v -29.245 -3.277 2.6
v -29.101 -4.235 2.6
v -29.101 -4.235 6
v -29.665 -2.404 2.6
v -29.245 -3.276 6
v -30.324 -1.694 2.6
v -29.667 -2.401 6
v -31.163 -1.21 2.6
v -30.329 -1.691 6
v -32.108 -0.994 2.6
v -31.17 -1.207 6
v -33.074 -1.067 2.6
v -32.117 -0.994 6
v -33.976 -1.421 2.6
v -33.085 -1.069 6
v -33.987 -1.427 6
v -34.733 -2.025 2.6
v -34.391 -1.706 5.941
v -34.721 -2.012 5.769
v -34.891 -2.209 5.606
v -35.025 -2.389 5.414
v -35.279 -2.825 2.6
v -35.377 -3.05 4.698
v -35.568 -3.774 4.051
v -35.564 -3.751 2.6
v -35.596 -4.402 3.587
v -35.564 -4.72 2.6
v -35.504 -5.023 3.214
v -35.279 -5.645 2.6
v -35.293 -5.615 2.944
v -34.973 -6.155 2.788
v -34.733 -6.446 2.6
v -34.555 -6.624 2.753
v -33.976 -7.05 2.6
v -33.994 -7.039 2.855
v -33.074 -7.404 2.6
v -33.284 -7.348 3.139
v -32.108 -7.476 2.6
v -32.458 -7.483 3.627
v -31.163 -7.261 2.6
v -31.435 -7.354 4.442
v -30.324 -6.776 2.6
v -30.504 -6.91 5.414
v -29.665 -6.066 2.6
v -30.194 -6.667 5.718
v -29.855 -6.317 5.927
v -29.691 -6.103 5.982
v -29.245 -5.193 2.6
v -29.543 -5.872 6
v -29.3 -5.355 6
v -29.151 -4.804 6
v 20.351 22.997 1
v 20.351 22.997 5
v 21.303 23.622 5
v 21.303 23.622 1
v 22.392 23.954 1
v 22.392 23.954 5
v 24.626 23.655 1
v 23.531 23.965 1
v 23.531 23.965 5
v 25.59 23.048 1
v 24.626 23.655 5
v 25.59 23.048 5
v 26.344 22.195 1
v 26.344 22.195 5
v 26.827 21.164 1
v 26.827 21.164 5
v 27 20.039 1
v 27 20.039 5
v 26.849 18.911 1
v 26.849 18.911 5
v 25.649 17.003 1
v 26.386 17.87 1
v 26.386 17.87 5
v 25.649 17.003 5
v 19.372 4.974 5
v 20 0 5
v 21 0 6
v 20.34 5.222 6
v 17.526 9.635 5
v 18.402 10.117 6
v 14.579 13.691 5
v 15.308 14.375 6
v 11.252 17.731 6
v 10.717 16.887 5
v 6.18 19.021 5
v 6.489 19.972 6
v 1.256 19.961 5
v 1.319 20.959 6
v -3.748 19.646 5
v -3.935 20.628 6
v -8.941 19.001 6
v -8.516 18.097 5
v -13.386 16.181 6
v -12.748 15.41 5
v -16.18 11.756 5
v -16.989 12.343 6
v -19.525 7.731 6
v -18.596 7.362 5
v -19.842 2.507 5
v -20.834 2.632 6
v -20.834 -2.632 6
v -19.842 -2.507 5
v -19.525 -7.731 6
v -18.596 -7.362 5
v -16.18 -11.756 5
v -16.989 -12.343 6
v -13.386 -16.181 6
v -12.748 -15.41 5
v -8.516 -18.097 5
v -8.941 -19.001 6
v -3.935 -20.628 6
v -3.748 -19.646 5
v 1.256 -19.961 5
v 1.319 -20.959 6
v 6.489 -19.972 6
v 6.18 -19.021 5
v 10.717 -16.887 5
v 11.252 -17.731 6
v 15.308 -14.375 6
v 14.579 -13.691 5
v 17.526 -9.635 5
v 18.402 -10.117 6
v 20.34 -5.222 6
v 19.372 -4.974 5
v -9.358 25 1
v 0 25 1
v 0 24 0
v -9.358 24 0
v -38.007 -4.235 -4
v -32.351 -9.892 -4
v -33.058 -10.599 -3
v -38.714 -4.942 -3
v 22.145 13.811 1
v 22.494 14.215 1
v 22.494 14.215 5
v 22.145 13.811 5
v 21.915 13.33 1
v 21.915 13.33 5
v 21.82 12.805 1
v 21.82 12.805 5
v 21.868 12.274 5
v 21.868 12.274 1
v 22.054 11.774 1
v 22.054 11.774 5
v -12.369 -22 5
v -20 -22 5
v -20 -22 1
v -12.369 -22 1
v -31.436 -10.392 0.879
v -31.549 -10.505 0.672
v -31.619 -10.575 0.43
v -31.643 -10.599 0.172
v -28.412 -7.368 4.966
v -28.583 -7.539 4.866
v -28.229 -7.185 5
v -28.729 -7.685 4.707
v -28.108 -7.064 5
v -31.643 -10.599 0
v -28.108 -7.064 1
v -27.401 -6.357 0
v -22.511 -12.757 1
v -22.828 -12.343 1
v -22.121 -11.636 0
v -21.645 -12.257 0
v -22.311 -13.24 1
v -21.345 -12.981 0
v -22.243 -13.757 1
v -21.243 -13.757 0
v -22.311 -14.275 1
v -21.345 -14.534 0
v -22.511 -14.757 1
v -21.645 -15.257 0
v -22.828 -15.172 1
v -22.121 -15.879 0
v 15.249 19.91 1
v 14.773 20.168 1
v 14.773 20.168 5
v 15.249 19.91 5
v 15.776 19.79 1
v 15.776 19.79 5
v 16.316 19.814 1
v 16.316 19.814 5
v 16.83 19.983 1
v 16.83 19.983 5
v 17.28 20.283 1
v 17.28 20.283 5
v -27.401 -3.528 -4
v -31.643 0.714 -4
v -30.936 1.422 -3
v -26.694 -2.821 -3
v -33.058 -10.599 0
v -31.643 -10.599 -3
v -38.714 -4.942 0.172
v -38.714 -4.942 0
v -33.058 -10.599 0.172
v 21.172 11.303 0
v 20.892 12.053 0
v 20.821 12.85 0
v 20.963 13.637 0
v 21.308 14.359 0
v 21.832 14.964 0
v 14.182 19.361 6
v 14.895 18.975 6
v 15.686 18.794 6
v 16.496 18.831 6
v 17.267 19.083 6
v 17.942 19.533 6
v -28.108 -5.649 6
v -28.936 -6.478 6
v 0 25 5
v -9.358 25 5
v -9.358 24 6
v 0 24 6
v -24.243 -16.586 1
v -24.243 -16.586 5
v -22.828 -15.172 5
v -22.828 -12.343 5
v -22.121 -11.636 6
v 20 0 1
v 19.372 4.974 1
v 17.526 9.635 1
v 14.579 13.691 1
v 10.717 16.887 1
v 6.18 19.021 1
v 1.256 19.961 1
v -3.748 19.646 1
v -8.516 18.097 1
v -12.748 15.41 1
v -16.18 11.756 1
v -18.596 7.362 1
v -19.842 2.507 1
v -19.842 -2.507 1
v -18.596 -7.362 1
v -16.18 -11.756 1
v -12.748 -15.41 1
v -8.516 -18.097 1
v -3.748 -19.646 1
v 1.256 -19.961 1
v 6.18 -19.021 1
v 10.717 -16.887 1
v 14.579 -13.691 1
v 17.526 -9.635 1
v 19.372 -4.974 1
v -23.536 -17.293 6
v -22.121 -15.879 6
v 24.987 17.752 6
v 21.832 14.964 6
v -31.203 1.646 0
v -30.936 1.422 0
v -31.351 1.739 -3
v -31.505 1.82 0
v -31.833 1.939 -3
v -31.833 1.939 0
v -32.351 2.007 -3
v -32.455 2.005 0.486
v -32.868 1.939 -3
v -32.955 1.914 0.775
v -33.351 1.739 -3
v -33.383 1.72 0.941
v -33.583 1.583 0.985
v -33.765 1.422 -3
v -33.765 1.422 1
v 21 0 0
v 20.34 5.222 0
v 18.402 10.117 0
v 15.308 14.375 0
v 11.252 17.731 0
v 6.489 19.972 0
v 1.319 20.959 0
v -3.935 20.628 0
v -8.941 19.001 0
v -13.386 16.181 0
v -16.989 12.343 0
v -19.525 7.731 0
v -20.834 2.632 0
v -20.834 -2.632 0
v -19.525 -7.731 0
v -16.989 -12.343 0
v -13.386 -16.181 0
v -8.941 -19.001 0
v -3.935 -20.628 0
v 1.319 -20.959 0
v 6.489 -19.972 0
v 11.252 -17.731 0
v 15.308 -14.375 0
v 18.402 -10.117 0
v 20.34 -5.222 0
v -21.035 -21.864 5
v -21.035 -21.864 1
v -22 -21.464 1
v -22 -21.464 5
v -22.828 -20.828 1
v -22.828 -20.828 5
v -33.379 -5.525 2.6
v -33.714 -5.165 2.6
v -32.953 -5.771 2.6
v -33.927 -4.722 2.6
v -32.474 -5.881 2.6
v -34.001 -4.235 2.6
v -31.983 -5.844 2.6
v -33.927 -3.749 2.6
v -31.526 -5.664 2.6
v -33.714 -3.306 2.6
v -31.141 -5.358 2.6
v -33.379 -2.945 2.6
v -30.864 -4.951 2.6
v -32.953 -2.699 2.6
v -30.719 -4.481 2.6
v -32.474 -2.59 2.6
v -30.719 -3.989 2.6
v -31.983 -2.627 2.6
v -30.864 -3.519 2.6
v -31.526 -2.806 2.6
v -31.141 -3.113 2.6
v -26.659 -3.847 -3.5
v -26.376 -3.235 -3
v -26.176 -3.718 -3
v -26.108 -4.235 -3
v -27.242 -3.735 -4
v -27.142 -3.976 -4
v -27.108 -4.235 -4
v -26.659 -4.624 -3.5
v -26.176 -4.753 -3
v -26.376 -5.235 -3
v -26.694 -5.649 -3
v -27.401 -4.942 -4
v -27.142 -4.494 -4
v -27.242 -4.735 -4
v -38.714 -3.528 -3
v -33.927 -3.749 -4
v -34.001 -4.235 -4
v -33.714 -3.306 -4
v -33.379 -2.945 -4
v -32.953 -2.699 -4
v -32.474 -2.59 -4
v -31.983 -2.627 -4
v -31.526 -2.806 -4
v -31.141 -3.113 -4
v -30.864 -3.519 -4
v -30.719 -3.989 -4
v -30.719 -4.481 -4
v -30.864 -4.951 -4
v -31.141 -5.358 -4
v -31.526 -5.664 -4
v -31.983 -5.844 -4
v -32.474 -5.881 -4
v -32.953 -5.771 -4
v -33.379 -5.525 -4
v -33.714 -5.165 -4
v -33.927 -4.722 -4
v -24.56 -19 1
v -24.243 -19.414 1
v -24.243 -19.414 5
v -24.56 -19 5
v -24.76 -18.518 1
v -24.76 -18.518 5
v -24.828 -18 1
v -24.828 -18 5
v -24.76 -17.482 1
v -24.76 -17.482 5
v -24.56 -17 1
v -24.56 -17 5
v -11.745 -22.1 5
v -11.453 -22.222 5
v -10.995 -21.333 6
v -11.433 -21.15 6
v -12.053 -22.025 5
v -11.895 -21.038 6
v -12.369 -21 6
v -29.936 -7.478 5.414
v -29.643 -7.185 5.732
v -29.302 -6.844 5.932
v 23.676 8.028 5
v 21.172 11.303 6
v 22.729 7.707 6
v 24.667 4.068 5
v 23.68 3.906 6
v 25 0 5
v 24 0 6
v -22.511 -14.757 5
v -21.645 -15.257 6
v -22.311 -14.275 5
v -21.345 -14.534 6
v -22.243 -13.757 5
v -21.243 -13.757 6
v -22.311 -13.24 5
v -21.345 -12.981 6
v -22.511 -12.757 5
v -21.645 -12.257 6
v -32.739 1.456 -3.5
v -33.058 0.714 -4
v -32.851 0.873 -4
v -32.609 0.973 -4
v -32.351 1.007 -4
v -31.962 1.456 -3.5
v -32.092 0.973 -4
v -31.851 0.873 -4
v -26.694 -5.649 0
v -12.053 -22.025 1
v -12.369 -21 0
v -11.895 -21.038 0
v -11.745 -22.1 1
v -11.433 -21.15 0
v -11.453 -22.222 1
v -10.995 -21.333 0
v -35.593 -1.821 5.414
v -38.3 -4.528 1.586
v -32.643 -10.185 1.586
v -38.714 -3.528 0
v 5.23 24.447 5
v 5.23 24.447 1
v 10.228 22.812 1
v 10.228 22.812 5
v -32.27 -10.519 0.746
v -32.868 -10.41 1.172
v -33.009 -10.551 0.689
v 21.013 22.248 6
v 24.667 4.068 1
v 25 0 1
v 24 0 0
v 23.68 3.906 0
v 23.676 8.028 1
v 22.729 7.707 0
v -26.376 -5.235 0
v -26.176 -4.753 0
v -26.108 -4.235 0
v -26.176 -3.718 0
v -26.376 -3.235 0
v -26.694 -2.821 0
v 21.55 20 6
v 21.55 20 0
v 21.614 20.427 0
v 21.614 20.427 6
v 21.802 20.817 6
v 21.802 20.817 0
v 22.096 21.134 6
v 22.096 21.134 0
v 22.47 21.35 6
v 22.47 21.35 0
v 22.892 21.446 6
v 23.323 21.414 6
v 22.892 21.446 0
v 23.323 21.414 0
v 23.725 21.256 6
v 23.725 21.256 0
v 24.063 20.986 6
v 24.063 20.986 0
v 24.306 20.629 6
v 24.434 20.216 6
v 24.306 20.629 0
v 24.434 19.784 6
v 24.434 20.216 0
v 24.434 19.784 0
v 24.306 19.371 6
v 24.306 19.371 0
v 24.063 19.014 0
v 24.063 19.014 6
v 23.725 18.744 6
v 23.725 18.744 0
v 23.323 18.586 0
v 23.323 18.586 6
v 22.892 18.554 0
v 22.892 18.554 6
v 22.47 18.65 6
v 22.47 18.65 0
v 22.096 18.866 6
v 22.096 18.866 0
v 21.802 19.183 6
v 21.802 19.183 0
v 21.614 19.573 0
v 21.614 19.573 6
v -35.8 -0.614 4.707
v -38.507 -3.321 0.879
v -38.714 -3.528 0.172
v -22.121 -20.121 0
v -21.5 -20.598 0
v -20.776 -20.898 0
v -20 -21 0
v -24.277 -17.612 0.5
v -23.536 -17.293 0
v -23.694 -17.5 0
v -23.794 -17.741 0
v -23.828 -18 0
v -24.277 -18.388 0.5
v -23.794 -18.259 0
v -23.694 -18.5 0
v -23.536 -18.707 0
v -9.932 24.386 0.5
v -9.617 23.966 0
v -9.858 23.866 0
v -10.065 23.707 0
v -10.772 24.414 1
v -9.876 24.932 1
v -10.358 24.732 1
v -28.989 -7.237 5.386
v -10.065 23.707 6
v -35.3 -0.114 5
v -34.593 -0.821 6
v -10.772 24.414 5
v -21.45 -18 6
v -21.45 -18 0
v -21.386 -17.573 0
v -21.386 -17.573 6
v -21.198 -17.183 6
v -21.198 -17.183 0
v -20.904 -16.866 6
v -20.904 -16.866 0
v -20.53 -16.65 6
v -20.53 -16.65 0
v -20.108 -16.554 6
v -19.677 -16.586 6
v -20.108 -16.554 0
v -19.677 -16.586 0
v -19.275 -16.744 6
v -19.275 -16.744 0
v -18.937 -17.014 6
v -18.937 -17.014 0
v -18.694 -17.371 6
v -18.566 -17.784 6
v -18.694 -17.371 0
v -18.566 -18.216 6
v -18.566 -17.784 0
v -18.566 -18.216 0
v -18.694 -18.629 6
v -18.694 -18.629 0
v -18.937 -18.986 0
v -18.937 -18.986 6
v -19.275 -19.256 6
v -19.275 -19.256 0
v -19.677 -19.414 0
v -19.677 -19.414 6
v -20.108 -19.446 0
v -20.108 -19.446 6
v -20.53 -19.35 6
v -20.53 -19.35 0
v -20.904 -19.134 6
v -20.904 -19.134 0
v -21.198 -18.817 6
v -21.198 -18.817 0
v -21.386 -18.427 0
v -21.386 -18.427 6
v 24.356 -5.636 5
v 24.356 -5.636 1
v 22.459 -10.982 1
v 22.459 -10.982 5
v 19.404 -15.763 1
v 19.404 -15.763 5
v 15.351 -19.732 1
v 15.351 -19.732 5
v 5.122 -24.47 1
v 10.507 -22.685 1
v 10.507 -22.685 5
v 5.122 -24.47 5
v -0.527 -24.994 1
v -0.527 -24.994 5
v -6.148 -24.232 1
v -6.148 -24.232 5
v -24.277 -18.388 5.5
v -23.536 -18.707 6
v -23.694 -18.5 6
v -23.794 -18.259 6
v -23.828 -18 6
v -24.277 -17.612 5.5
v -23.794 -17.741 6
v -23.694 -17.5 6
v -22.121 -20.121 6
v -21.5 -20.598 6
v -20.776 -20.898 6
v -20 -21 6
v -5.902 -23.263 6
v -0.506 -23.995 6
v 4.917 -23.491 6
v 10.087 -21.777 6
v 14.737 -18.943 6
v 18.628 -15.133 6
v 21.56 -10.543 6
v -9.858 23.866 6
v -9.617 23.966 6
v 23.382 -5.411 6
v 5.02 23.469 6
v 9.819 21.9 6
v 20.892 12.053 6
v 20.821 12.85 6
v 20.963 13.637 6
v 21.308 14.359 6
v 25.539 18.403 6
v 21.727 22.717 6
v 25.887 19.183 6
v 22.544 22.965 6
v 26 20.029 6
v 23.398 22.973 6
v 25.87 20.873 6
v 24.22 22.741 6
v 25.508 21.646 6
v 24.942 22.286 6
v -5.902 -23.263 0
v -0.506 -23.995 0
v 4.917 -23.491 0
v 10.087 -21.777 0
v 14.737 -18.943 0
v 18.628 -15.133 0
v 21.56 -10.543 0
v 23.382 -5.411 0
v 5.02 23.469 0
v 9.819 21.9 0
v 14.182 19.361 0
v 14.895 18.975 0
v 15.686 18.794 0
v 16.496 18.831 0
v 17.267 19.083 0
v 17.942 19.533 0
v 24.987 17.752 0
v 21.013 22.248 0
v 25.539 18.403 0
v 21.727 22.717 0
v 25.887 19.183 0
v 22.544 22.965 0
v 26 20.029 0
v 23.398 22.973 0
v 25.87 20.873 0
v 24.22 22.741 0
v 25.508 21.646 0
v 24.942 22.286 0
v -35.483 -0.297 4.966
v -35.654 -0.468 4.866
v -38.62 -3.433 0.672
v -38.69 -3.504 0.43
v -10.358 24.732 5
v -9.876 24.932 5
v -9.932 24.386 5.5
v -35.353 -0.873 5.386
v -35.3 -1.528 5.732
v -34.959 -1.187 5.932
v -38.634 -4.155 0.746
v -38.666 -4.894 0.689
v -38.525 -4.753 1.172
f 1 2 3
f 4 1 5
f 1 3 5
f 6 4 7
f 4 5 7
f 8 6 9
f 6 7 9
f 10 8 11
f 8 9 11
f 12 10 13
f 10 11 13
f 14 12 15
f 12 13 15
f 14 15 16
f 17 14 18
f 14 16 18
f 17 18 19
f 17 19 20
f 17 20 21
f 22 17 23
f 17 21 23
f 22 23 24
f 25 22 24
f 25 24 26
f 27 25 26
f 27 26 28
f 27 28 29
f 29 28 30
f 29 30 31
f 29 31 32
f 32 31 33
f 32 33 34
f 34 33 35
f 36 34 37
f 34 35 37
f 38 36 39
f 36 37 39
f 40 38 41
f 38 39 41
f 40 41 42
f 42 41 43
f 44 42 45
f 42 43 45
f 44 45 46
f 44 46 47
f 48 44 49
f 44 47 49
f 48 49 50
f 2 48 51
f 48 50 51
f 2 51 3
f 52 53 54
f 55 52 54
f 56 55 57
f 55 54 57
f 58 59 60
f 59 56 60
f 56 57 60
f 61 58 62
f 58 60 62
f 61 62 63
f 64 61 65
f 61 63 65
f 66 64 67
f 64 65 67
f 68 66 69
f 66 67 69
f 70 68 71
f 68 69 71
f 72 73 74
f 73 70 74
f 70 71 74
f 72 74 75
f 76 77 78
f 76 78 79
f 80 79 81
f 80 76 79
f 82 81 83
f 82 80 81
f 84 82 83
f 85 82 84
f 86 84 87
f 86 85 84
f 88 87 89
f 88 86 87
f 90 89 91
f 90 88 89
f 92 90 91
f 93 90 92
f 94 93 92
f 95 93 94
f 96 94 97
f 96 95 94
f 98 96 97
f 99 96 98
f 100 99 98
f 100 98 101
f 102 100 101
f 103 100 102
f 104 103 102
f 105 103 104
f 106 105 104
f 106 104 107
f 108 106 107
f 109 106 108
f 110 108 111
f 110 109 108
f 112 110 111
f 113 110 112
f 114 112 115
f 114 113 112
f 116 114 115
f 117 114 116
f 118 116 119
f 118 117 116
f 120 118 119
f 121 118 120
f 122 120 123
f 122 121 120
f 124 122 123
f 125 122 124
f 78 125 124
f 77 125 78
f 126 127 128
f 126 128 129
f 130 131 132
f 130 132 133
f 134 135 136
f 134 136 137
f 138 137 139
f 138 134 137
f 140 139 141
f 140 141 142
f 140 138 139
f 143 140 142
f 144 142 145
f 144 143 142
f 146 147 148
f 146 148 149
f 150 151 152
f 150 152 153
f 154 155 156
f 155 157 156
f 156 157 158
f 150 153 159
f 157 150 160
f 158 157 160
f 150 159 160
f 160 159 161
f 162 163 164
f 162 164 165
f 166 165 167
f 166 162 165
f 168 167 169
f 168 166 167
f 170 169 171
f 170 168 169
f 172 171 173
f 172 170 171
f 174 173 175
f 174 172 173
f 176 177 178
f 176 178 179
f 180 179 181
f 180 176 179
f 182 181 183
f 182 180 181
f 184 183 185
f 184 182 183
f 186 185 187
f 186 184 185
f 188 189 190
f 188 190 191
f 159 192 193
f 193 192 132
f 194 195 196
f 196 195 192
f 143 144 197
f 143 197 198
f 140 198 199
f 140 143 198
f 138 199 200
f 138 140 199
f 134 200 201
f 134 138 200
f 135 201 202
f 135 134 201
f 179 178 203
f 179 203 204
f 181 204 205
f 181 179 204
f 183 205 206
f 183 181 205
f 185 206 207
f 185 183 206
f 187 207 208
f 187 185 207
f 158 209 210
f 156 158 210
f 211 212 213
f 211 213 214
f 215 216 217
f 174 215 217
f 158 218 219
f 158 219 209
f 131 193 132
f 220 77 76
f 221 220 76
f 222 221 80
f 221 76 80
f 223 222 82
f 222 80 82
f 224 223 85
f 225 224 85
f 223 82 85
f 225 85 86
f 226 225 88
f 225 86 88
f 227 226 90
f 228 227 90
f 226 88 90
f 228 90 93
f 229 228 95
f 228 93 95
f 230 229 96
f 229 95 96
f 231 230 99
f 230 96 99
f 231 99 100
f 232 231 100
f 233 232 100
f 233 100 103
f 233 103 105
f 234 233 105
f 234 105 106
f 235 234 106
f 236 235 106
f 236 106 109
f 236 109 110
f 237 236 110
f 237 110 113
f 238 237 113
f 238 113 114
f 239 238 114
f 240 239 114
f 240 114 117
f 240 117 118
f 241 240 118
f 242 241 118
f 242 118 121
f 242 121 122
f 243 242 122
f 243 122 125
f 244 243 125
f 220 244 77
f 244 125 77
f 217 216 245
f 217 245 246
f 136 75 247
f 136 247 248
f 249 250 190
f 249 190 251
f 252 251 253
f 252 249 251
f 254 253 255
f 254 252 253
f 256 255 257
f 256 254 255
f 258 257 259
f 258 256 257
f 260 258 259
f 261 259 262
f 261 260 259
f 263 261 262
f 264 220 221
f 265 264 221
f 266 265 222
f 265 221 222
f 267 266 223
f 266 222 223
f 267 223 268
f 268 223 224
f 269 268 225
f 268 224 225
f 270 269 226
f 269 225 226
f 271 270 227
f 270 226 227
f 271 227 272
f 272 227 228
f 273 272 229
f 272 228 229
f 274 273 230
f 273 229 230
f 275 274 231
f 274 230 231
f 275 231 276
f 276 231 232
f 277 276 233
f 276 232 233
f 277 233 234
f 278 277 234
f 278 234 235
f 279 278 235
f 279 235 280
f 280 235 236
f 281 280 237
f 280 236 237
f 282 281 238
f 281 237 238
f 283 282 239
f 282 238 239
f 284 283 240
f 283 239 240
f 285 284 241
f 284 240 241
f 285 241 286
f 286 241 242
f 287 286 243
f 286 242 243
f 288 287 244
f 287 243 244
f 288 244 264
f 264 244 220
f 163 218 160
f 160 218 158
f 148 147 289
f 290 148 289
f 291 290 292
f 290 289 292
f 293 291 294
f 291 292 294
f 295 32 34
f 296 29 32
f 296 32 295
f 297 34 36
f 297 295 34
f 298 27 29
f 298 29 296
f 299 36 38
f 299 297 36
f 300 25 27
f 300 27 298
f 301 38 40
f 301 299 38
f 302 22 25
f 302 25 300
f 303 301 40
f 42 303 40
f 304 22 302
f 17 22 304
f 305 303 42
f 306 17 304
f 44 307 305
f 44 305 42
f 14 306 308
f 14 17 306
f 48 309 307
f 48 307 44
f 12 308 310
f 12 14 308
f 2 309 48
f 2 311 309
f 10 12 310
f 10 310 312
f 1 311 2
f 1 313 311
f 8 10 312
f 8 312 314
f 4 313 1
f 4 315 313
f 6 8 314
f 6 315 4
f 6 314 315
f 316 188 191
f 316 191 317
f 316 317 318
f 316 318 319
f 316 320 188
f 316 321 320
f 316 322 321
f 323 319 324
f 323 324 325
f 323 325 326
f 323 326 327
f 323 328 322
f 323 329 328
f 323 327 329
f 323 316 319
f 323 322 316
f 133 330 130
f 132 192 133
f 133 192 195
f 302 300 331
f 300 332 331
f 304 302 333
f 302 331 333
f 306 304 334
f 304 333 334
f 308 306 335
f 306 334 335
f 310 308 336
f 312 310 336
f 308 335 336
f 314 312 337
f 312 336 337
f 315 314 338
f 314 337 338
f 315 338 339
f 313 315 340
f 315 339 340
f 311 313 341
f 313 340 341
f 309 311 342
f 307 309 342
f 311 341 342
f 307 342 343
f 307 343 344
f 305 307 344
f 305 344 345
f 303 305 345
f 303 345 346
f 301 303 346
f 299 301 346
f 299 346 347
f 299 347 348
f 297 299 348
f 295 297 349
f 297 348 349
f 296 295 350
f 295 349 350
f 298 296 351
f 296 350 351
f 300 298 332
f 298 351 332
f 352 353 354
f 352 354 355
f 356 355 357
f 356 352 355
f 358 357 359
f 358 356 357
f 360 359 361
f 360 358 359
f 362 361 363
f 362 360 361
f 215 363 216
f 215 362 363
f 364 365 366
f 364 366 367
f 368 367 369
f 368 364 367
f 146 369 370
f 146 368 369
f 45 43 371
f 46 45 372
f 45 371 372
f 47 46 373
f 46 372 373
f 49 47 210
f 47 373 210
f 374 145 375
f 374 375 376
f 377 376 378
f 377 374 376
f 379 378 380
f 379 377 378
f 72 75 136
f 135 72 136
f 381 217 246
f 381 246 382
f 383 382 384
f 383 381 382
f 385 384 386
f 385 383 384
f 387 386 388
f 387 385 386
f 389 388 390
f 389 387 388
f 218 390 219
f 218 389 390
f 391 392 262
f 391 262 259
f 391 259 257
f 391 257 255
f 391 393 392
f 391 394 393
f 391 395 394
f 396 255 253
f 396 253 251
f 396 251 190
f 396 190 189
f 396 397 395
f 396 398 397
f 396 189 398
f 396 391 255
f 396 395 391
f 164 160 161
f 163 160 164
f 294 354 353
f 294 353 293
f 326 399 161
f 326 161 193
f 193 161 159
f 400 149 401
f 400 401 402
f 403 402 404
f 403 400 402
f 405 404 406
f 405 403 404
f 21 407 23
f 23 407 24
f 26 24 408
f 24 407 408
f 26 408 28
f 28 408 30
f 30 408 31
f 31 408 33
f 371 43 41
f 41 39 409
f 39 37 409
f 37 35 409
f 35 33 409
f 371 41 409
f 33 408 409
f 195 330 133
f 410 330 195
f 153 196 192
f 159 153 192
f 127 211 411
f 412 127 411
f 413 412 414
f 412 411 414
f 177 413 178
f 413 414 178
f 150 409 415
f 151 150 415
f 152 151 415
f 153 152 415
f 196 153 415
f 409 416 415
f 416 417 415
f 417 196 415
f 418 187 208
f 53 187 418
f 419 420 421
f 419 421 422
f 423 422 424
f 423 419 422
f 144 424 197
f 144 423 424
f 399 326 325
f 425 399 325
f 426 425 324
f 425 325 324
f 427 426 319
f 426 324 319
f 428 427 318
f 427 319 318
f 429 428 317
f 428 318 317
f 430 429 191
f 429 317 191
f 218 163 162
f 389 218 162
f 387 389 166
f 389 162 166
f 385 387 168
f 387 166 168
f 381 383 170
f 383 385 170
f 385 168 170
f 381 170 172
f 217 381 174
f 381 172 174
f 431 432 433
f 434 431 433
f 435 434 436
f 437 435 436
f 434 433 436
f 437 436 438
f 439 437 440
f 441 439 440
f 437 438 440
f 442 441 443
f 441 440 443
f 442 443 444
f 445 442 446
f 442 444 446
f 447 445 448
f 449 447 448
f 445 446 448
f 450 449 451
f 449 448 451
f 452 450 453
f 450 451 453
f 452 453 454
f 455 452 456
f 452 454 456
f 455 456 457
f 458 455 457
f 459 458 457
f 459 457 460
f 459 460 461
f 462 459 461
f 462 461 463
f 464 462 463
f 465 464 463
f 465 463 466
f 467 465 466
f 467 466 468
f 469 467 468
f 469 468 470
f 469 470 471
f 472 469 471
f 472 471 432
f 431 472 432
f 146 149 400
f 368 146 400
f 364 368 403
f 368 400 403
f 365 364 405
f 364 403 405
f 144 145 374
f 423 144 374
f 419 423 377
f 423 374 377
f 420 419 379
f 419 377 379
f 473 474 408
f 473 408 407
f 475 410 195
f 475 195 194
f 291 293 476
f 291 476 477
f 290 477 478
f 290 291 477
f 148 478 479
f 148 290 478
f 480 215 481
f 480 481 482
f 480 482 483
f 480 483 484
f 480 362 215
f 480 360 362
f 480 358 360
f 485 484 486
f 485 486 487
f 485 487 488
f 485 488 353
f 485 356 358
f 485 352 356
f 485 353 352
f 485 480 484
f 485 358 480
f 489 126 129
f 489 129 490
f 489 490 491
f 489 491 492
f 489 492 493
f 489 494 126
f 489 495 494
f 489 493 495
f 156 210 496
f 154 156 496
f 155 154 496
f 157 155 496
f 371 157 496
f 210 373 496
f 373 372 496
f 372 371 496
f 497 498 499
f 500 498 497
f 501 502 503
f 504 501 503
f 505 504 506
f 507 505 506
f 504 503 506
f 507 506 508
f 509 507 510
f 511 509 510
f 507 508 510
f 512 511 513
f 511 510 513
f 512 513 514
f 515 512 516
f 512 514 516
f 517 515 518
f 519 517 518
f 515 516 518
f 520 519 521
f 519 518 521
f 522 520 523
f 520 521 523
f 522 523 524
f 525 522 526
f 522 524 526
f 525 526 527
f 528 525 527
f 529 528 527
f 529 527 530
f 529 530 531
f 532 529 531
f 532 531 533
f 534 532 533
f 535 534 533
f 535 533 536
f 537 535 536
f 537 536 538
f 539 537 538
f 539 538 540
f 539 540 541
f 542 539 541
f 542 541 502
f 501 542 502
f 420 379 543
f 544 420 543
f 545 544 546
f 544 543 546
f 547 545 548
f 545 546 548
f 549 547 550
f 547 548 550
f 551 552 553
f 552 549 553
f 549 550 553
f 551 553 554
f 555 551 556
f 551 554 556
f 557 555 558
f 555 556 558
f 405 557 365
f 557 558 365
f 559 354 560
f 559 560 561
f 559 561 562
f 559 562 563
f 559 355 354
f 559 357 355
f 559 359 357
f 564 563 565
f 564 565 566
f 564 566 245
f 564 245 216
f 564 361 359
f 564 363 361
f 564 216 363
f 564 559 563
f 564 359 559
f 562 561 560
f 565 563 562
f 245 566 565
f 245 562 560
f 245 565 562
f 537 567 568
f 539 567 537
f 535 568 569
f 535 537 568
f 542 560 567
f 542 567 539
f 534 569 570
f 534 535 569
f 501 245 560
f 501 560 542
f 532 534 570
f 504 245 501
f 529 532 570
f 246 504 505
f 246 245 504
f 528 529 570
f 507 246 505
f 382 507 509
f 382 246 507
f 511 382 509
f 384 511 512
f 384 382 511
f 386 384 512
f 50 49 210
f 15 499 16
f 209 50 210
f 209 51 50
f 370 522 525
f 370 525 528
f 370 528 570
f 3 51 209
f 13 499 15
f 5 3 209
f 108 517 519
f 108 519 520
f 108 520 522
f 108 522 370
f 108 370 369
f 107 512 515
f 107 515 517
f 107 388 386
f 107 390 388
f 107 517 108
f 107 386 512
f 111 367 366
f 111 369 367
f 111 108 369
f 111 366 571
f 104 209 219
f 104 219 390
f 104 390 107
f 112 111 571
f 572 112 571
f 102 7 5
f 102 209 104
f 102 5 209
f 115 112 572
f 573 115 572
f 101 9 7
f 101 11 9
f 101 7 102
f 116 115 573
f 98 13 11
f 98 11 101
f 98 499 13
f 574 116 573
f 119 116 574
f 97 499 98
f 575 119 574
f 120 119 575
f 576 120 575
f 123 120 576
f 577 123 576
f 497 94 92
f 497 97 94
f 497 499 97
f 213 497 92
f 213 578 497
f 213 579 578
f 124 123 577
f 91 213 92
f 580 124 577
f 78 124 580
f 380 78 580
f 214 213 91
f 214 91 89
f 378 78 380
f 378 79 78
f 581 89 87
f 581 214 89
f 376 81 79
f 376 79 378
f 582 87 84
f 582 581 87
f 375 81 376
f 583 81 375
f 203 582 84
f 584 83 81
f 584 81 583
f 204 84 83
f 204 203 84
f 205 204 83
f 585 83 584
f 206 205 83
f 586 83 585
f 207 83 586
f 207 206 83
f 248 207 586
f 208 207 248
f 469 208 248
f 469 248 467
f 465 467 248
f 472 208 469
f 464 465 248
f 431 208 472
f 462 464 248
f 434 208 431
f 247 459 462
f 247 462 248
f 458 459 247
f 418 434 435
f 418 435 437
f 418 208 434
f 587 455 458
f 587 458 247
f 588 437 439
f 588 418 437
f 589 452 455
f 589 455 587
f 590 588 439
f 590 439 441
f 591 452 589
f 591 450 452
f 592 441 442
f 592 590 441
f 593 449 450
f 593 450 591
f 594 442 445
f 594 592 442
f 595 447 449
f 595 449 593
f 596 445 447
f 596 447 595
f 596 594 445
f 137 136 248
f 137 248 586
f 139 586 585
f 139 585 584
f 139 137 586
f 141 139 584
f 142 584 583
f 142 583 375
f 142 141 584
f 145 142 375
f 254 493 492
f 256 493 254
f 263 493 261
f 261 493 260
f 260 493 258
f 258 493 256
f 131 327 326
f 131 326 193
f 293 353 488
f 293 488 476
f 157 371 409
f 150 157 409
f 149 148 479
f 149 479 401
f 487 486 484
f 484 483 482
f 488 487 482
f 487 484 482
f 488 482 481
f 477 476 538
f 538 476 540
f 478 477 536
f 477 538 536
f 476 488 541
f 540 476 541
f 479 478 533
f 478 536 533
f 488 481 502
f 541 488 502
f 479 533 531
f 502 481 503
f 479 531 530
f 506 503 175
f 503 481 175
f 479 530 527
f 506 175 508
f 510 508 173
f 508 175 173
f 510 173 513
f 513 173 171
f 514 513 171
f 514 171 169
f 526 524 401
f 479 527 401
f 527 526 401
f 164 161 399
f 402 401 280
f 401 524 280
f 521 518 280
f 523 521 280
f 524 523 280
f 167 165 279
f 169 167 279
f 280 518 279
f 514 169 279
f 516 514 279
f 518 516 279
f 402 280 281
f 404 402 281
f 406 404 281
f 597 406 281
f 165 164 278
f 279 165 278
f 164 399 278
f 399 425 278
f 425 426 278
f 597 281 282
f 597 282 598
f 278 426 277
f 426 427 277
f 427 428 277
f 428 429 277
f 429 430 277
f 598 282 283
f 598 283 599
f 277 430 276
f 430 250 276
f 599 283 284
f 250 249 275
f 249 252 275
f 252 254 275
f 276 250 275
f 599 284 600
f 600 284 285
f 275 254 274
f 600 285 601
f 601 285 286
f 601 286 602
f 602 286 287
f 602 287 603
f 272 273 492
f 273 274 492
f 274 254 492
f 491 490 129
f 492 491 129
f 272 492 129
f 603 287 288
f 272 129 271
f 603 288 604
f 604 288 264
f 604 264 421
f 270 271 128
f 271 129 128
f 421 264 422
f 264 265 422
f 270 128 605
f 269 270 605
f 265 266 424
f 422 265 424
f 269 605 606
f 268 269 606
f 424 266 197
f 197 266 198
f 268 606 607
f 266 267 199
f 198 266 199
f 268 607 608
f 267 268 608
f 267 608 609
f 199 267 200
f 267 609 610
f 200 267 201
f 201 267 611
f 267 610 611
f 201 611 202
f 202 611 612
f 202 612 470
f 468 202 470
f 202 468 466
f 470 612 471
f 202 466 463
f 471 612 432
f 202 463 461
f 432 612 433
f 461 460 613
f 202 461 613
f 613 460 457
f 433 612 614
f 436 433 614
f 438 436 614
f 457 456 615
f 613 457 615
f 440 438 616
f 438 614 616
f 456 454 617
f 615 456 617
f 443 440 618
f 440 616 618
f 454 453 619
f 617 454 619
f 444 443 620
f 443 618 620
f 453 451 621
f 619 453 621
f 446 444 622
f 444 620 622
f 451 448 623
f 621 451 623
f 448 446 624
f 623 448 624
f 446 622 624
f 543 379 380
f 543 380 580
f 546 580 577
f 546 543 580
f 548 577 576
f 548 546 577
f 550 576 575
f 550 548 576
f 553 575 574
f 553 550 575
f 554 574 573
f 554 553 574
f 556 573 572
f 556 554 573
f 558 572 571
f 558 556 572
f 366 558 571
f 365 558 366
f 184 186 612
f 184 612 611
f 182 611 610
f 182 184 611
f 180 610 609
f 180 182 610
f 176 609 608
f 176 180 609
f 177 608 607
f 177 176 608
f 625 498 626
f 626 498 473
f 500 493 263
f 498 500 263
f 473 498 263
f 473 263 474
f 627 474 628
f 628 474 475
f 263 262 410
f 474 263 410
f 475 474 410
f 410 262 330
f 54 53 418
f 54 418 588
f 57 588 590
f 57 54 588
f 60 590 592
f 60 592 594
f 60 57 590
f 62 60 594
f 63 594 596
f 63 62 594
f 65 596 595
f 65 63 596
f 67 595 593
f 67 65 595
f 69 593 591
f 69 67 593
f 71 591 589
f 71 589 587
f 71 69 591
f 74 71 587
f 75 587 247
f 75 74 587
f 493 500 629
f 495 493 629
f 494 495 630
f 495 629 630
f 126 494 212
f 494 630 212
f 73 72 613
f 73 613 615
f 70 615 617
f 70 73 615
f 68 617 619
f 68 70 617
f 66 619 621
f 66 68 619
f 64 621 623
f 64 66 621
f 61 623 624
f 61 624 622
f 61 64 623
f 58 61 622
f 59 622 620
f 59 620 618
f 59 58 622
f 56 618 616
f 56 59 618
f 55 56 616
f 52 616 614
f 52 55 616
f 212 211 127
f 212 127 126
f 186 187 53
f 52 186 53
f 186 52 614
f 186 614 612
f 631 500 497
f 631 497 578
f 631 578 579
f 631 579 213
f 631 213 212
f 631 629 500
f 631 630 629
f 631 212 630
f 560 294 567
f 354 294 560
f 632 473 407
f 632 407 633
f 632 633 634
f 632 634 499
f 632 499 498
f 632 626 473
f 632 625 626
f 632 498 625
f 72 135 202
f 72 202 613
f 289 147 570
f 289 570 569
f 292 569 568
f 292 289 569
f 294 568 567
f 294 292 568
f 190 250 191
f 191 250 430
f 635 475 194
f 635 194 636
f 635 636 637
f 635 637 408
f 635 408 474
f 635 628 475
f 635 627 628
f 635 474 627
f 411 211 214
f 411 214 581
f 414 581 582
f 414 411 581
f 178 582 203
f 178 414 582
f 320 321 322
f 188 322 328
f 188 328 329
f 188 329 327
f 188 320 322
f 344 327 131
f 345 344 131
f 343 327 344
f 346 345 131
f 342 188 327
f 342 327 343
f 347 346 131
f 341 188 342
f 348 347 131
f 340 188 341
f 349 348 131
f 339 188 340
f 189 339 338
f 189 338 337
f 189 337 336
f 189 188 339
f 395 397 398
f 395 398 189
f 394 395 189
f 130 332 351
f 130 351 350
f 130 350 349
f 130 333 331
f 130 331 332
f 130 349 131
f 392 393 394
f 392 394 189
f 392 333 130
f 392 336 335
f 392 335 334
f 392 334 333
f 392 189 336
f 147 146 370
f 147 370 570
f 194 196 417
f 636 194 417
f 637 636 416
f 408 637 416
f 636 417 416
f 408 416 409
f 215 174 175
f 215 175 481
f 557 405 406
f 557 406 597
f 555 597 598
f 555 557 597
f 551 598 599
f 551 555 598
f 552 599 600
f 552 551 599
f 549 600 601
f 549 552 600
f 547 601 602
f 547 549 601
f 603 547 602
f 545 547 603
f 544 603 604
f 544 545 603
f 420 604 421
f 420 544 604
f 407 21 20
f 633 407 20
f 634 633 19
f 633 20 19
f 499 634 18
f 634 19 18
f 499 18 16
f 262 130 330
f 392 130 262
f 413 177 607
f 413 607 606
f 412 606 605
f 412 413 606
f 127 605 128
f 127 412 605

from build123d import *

# Parameters (mm, degrees)
SKETCH_1_W                   = 60
SKETCH_1_H                   = 55
EXTRUDE_1_DEPTH              = 6
HOLE_WIZARD_M4_1_D           = 2.9
HOLE_WIZARD_M4_1_DEPTH       = 10
SKETCH_5_R                   = 20
CUT_EXTRUDE_1_DEPTH          = 7
SKETCH_6_W                   = 60
SKETCH_6_H                   = 55
CUT_EXTRUDE_2_DEPTH          = 7
EXTRUDE_2_DEPTH              = 6
EXTRUDE_3_DEPTH              = 6
EXTRUDE_4_DEPTH              = 4
CUT_EXTRUDE_3_DEPTH          = 11
CUT_EXTRUDE_4_DEPTH          = 6
FILLET_1_R                   = 2
EXTRUDE_5_DEPTH              = 6
CHAMFER_2_SIZE               = 5
FILLET_4_R                   = 2
CHAMFER_3_SIZE               = 1
HOLE_WIZARD_M3_2_D           = 3.3
HOLE_WIZARD_M3_2_DEPTH       = 10
HOLE_WIZARD_M3_2_CBORE_D     = 6.5
HOLE_WIZARD_M3_2_CBORE_DEPTH = 3.4
HOLE_WIZARD_M3_2_TIP         = 0.991420021


with BuildPart() as part:
    # ｽｹｯﾁ1 → ﾎﾞｽ - 押し出し1 (new body)
    with BuildSketch(Plane.XY):
        Rectangle(SKETCH_1_W, SKETCH_1_H)
    extrude(amount=EXTRUDE_1_DEPTH)

    # M4 すきま穴1
    with Locations(Plane.XY.offset(6)):
        with Locations((-20, -18), (23, 20)):
            Hole(HOLE_WIZARD_M4_1_D / 2, depth=HOLE_WIZARD_M4_1_DEPTH)

    # ｽｹｯﾁ5 → ｶｯﾄ - 押し出し1 (cut, through all)
    with BuildSketch(Plane.XY.offset(6)):
        Circle(SKETCH_5_R)
    extrude(amount=-CUT_EXTRUDE_1_DEPTH, mode=Mode.SUBTRACT)

    # ｽｹｯﾁ6 → ｶｯﾄ - 押し出し2 (cut, through all)
    with BuildSketch(Plane.XY.offset(6)):
        Rectangle(SKETCH_6_W, SKETCH_6_H)
        with BuildLine():
            ThreePointArc((-17.351208814, -20.997316342), (-22.997316342, -20.648791186), (-22.648791186, -15.002683658))
            Line((-22.648791186, -15.002683658), (-21.007829355, -13.552531342))
            ThreePointArc((-21.007829355, -13.552531342), (-16.554944912, 18.733227137), (16.03335661, 19.181539975))
            Line((16.03335661, 19.181539975), (20.351208814, 22.997316342))
            ThreePointArc((20.351208814, 22.997316342), (25.997316342, 22.648791186), (25.648791186, 17.002683658))
            Line((25.648791186, 17.002683658), (21.271672672, 13.134532414))
            ThreePointArc((21.271672672, 13.134532414), (24.04986296, 6.826718948), (25, 0))
            ThreePointArc((25, 0), (10.810307191, -22.541900062), (-15.650980674, -19.494789148))
            Line((-15.650980674, -19.494789148), (-17.351208814, -20.997316342))
        make_face(mode=Mode.SUBTRACT)
    extrude(amount=-CUT_EXTRUDE_2_DEPTH, mode=Mode.SUBTRACT)

    # ｽｹｯﾁ7 → ﾎﾞｽ - 押し出し2 (add)
    with BuildSketch(Plane.XY.offset(6)):
        with BuildLine():
            Line((0, 25), (-21.5, 25))
            Line((-21.5, 25), (-21.5, 12.757350822))
            ThreePointArc((-21.5, 12.757350822), (-12.370655388, 21.724798855), (0, 25))
        make_face()
        with BuildLine():
            ThreePointArc((-17.351208814, -20.997316342), (-18.583890076, -21.74094008), (-20, -22))
            Line((-20, -22), (-11.874342087, -22))
            ThreePointArc((-11.874342087, -22), (-13.819546614, -20.833149819), (-15.650980674, -19.494789148))
            Line((-15.650980674, -19.494789148), (-17.351208814, -20.997316342))
        make_face()
        with BuildLine():
            ThreePointArc((-21.007829355, -13.552531342), (-21.25763315, -13.157242601), (-21.5, -12.757350822))
            Line((-21.5, -12.757350822), (-21.5, -13.987472843))
            Line((-21.5, -13.987472843), (-21.007829355, -13.552531342))
        make_face()
    extrude(amount=-EXTRUDE_2_DEPTH)

    # ｽｹｯﾁ8 → ﾎﾞｽ - 押し出し3 (add)
    with BuildSketch(Plane.XY.offset(6)):
        with BuildLine():
            Line((-21.5, 12.757350822), (-21.5, 25))
            Line((-21.5, 25), (-45.078427125, 1.421572875))
            Line((-45.078427125, 1.421572875), (-22.82842714, -20.828427109))
            ThreePointArc((-22.82842714, -20.828427109), (-23.998099778, -17.876719173), (-22.648791186, -15.002683658))
            Line((-22.648791186, -15.002683658), (-21.5, -13.987472843))
            Line((-21.5, -13.987472843), (-21.5, -12.757350822))
            ThreePointArc((-21.5, -12.757350822), (-25, 0), (-21.5, 12.757350822))
        make_face()
    extrude(amount=-EXTRUDE_3_DEPTH)

    # ｽｹｯﾁ9 → ﾎﾞｽ - 押し出し4 (add)
    with BuildSketch(Plane(origin=(0, 0, 0), x_dir=(-1, 0, 0), z_dir=(0, 0, -1))):
        Polygon((25.279437252, -4.235281374), (32.350505063, -11.306349186), (45.078427125, 1.421572875), (38.007359313, 8.492640687), align=None)
    extrude(amount=EXTRUDE_4_DEPTH)

    # ｽｹｯﾁ10 → ｶｯﾄ - 押し出し3 (cut, through all)
    with BuildSketch(Plane(origin=(0, 0, -4), x_dir=(-1, 0, 0), z_dir=(0, 0, -1))):
        Polygon((38.007359313, 8.492640687), (21.5, 25), (10.186291501, 25), (39.421572875, -4.235281374), (45.078427125, 1.421572875), align=None)
    extrude(amount=-CUT_EXTRUDE_3_DEPTH, mode=Mode.SUBTRACT)

    # ｽｹｯﾁ12 → ｶｯﾄ - 押し出し4 (cut)
    with BuildSketch(Plane.XY.offset(6)):
        Polygon((-39.421572875, -4.235281374), (-25.656854249, -18), (-21.414213562, -13.757359313), (-35.178932188, 0.007359313), align=None)
    extrude(amount=-CUT_EXTRUDE_4_DEPTH, mode=Mode.SUBTRACT)

    # ﾌｨﾚｯﾄ1
    fillet_1_edges = [part.edges().sort_by_distance(p)[0] for p in [
        (-25.279437252, -4.235281374, -2),
        (-32.350505063, 2.835786438, -2),
        (-25.656854249, -18, 3),
    ]]
    fillet(fillet_1_edges, radius=FILLET_1_R)

    # ｽｹｯﾁ13 → ﾎﾞｽ - 押し出し5 (add)
    with BuildSketch(Plane.XY):
        Polygon((-32.350505063, -11.306349186), (-28.107864376, -7.063708499), (-35.178932188, 0.007359313), (-39.421572875, -4.235281374), align=None)
    extrude(amount=EXTRUDE_5_DEPTH)

    # 面取り2
    chamfer_2_edges = [part.edges().sort_by_distance(p)[0] for p in [
        (-35.886038969, -7.77081528, 6),
    ]]
    chamfer(chamfer_2_edges, length=CHAMFER_2_SIZE)

    # ﾌｨﾚｯﾄ4
    fillet_4_edges = [part.edges().sort_by_distance(p)[0] for p in [
        (-10.186291501, 25, 3),
        (-21.414213562, -13.757359313, 3),
        (-32.350505063, -4.235281374, 6),
        (-35.886038969, -7.77081528, 1),
        (21.271672672, 13.134532414, 3),
        (16.03335661, 19.181539975, 3),
        (-11.874342087, -22, 3),
    ]]
    fillet(fillet_4_edges, radius=FILLET_4_R)

    # 面取り3
    chamfer_3_edges = [part.edges().sort_by_distance(p)[0] for p in [
        (-21.53073374, -21.695518126, 6),
        (-21.53073374, -21.695518126, 0),
        (-23.535533914, -20.121320336, 0),
        (-29.522077939, -8.477922061, -4),
        (-32.350505063, -11.306349186, -1.914213562),
        (-35.886038969, -7.77081528, -4),
        (-36.593145751, -1.406854249, -4),
        (-28.814971157, -0.699747468, -4),
        (-32.350505063, 2.007359313, -4),
        (-26.107864376, -4.235281374, -4),
        (-23.535533906, -15.878679656, 6),
        (-23.535533906, -15.878679656, 0),
        (-23.535533914, -20.121320336, 6),
        (-24.828427125, -18, 6),
        (-24.828427125, -18, 0),
        (24.071292776, 15.608615296, 6),
        (24.071292776, 15.608615296, 0),
        (17.805324329, -17.549086174, 0),
        (17.805324329, -17.549086174, 6),
        (7.771710455, 23.761323966, 6),
        (7.771710455, 23.761323966, 0),
        (18.815379015, 21.640071403, 6),
        (18.815379015, 21.640071403, 0),
        (-39.421572875, -4.235281374, -1.914213562),
        (-37.653805922, -2.467514421, 3.5),
        (-23.036165235, 12.150126266, 6),
        (-22.268398282, 12.917893219, 0),
        (-35.841448632, -0.655157131, 5.847759065),
        (-39.313922278, -4.127630777, 0.93693974),
        (-25.468145751, -9.703427125, 0),
        (-4.678932188, 25, 0),
        (-16.184658438, -22, 0),
        (-10.123231241, 24.847759065, 0),
        (-28.168524548, -7.124368671, 6),
        (-25.468145751, -9.703427125, 6),
        (-10.123231241, 24.847759065, 6),
        (-30.58273811, -9.538582233, 3.5),
        (-28.77038082, -7.726224943, 5.847759065),
        (-32.242854466, -11.198698589, 0.93693974),
        (21.8499093, 13.07067214, 0),
        (21.8499093, 13.07067214, 6),
        (16.046656493, 19.783578925, 0),
        (16.046656493, 19.783578925, 6),
        (-11.897912356, -22.056349368, 6),
        (-11.897912356, -22.056349368, 0),
        (-22.242640687, -13.757359313, 6),
        (-22.242640687, -13.757359313, 0),
        (-20, 0, 0),
        (-20, 0, 6),
        (25.997316342, 22.648791186, 0),
        (25.997316342, 22.648791186, 6),
        (-16.184658438, -22, 6),
        (-4.678932188, 25, 6),
    ]]
    chamfer(chamfer_3_edges, length=CHAMFER_3_SIZE)

    # M3 六角穴付き頭ねじ用座ぐり穴2
    with Locations(Plane.XY.offset(6)):
        with Locations((-32.350505063, -4.235281374)):
            CounterBoreHole(HOLE_WIZARD_M3_2_D / 2, HOLE_WIZARD_M3_2_CBORE_D / 2, HOLE_WIZARD_M3_2_CBORE_DEPTH, depth=HOLE_WIZARD_M3_2_DEPTH)
            with Locations((0, 0, -(HOLE_WIZARD_M3_2_DEPTH + HOLE_WIZARD_M3_2_TIP / 2))):  # 118° drill point
                Cone(0, HOLE_WIZARD_M3_2_D / 2, HOLE_WIZARD_M3_2_TIP, mode=Mode.SUBTRACT)


solid = part.part
